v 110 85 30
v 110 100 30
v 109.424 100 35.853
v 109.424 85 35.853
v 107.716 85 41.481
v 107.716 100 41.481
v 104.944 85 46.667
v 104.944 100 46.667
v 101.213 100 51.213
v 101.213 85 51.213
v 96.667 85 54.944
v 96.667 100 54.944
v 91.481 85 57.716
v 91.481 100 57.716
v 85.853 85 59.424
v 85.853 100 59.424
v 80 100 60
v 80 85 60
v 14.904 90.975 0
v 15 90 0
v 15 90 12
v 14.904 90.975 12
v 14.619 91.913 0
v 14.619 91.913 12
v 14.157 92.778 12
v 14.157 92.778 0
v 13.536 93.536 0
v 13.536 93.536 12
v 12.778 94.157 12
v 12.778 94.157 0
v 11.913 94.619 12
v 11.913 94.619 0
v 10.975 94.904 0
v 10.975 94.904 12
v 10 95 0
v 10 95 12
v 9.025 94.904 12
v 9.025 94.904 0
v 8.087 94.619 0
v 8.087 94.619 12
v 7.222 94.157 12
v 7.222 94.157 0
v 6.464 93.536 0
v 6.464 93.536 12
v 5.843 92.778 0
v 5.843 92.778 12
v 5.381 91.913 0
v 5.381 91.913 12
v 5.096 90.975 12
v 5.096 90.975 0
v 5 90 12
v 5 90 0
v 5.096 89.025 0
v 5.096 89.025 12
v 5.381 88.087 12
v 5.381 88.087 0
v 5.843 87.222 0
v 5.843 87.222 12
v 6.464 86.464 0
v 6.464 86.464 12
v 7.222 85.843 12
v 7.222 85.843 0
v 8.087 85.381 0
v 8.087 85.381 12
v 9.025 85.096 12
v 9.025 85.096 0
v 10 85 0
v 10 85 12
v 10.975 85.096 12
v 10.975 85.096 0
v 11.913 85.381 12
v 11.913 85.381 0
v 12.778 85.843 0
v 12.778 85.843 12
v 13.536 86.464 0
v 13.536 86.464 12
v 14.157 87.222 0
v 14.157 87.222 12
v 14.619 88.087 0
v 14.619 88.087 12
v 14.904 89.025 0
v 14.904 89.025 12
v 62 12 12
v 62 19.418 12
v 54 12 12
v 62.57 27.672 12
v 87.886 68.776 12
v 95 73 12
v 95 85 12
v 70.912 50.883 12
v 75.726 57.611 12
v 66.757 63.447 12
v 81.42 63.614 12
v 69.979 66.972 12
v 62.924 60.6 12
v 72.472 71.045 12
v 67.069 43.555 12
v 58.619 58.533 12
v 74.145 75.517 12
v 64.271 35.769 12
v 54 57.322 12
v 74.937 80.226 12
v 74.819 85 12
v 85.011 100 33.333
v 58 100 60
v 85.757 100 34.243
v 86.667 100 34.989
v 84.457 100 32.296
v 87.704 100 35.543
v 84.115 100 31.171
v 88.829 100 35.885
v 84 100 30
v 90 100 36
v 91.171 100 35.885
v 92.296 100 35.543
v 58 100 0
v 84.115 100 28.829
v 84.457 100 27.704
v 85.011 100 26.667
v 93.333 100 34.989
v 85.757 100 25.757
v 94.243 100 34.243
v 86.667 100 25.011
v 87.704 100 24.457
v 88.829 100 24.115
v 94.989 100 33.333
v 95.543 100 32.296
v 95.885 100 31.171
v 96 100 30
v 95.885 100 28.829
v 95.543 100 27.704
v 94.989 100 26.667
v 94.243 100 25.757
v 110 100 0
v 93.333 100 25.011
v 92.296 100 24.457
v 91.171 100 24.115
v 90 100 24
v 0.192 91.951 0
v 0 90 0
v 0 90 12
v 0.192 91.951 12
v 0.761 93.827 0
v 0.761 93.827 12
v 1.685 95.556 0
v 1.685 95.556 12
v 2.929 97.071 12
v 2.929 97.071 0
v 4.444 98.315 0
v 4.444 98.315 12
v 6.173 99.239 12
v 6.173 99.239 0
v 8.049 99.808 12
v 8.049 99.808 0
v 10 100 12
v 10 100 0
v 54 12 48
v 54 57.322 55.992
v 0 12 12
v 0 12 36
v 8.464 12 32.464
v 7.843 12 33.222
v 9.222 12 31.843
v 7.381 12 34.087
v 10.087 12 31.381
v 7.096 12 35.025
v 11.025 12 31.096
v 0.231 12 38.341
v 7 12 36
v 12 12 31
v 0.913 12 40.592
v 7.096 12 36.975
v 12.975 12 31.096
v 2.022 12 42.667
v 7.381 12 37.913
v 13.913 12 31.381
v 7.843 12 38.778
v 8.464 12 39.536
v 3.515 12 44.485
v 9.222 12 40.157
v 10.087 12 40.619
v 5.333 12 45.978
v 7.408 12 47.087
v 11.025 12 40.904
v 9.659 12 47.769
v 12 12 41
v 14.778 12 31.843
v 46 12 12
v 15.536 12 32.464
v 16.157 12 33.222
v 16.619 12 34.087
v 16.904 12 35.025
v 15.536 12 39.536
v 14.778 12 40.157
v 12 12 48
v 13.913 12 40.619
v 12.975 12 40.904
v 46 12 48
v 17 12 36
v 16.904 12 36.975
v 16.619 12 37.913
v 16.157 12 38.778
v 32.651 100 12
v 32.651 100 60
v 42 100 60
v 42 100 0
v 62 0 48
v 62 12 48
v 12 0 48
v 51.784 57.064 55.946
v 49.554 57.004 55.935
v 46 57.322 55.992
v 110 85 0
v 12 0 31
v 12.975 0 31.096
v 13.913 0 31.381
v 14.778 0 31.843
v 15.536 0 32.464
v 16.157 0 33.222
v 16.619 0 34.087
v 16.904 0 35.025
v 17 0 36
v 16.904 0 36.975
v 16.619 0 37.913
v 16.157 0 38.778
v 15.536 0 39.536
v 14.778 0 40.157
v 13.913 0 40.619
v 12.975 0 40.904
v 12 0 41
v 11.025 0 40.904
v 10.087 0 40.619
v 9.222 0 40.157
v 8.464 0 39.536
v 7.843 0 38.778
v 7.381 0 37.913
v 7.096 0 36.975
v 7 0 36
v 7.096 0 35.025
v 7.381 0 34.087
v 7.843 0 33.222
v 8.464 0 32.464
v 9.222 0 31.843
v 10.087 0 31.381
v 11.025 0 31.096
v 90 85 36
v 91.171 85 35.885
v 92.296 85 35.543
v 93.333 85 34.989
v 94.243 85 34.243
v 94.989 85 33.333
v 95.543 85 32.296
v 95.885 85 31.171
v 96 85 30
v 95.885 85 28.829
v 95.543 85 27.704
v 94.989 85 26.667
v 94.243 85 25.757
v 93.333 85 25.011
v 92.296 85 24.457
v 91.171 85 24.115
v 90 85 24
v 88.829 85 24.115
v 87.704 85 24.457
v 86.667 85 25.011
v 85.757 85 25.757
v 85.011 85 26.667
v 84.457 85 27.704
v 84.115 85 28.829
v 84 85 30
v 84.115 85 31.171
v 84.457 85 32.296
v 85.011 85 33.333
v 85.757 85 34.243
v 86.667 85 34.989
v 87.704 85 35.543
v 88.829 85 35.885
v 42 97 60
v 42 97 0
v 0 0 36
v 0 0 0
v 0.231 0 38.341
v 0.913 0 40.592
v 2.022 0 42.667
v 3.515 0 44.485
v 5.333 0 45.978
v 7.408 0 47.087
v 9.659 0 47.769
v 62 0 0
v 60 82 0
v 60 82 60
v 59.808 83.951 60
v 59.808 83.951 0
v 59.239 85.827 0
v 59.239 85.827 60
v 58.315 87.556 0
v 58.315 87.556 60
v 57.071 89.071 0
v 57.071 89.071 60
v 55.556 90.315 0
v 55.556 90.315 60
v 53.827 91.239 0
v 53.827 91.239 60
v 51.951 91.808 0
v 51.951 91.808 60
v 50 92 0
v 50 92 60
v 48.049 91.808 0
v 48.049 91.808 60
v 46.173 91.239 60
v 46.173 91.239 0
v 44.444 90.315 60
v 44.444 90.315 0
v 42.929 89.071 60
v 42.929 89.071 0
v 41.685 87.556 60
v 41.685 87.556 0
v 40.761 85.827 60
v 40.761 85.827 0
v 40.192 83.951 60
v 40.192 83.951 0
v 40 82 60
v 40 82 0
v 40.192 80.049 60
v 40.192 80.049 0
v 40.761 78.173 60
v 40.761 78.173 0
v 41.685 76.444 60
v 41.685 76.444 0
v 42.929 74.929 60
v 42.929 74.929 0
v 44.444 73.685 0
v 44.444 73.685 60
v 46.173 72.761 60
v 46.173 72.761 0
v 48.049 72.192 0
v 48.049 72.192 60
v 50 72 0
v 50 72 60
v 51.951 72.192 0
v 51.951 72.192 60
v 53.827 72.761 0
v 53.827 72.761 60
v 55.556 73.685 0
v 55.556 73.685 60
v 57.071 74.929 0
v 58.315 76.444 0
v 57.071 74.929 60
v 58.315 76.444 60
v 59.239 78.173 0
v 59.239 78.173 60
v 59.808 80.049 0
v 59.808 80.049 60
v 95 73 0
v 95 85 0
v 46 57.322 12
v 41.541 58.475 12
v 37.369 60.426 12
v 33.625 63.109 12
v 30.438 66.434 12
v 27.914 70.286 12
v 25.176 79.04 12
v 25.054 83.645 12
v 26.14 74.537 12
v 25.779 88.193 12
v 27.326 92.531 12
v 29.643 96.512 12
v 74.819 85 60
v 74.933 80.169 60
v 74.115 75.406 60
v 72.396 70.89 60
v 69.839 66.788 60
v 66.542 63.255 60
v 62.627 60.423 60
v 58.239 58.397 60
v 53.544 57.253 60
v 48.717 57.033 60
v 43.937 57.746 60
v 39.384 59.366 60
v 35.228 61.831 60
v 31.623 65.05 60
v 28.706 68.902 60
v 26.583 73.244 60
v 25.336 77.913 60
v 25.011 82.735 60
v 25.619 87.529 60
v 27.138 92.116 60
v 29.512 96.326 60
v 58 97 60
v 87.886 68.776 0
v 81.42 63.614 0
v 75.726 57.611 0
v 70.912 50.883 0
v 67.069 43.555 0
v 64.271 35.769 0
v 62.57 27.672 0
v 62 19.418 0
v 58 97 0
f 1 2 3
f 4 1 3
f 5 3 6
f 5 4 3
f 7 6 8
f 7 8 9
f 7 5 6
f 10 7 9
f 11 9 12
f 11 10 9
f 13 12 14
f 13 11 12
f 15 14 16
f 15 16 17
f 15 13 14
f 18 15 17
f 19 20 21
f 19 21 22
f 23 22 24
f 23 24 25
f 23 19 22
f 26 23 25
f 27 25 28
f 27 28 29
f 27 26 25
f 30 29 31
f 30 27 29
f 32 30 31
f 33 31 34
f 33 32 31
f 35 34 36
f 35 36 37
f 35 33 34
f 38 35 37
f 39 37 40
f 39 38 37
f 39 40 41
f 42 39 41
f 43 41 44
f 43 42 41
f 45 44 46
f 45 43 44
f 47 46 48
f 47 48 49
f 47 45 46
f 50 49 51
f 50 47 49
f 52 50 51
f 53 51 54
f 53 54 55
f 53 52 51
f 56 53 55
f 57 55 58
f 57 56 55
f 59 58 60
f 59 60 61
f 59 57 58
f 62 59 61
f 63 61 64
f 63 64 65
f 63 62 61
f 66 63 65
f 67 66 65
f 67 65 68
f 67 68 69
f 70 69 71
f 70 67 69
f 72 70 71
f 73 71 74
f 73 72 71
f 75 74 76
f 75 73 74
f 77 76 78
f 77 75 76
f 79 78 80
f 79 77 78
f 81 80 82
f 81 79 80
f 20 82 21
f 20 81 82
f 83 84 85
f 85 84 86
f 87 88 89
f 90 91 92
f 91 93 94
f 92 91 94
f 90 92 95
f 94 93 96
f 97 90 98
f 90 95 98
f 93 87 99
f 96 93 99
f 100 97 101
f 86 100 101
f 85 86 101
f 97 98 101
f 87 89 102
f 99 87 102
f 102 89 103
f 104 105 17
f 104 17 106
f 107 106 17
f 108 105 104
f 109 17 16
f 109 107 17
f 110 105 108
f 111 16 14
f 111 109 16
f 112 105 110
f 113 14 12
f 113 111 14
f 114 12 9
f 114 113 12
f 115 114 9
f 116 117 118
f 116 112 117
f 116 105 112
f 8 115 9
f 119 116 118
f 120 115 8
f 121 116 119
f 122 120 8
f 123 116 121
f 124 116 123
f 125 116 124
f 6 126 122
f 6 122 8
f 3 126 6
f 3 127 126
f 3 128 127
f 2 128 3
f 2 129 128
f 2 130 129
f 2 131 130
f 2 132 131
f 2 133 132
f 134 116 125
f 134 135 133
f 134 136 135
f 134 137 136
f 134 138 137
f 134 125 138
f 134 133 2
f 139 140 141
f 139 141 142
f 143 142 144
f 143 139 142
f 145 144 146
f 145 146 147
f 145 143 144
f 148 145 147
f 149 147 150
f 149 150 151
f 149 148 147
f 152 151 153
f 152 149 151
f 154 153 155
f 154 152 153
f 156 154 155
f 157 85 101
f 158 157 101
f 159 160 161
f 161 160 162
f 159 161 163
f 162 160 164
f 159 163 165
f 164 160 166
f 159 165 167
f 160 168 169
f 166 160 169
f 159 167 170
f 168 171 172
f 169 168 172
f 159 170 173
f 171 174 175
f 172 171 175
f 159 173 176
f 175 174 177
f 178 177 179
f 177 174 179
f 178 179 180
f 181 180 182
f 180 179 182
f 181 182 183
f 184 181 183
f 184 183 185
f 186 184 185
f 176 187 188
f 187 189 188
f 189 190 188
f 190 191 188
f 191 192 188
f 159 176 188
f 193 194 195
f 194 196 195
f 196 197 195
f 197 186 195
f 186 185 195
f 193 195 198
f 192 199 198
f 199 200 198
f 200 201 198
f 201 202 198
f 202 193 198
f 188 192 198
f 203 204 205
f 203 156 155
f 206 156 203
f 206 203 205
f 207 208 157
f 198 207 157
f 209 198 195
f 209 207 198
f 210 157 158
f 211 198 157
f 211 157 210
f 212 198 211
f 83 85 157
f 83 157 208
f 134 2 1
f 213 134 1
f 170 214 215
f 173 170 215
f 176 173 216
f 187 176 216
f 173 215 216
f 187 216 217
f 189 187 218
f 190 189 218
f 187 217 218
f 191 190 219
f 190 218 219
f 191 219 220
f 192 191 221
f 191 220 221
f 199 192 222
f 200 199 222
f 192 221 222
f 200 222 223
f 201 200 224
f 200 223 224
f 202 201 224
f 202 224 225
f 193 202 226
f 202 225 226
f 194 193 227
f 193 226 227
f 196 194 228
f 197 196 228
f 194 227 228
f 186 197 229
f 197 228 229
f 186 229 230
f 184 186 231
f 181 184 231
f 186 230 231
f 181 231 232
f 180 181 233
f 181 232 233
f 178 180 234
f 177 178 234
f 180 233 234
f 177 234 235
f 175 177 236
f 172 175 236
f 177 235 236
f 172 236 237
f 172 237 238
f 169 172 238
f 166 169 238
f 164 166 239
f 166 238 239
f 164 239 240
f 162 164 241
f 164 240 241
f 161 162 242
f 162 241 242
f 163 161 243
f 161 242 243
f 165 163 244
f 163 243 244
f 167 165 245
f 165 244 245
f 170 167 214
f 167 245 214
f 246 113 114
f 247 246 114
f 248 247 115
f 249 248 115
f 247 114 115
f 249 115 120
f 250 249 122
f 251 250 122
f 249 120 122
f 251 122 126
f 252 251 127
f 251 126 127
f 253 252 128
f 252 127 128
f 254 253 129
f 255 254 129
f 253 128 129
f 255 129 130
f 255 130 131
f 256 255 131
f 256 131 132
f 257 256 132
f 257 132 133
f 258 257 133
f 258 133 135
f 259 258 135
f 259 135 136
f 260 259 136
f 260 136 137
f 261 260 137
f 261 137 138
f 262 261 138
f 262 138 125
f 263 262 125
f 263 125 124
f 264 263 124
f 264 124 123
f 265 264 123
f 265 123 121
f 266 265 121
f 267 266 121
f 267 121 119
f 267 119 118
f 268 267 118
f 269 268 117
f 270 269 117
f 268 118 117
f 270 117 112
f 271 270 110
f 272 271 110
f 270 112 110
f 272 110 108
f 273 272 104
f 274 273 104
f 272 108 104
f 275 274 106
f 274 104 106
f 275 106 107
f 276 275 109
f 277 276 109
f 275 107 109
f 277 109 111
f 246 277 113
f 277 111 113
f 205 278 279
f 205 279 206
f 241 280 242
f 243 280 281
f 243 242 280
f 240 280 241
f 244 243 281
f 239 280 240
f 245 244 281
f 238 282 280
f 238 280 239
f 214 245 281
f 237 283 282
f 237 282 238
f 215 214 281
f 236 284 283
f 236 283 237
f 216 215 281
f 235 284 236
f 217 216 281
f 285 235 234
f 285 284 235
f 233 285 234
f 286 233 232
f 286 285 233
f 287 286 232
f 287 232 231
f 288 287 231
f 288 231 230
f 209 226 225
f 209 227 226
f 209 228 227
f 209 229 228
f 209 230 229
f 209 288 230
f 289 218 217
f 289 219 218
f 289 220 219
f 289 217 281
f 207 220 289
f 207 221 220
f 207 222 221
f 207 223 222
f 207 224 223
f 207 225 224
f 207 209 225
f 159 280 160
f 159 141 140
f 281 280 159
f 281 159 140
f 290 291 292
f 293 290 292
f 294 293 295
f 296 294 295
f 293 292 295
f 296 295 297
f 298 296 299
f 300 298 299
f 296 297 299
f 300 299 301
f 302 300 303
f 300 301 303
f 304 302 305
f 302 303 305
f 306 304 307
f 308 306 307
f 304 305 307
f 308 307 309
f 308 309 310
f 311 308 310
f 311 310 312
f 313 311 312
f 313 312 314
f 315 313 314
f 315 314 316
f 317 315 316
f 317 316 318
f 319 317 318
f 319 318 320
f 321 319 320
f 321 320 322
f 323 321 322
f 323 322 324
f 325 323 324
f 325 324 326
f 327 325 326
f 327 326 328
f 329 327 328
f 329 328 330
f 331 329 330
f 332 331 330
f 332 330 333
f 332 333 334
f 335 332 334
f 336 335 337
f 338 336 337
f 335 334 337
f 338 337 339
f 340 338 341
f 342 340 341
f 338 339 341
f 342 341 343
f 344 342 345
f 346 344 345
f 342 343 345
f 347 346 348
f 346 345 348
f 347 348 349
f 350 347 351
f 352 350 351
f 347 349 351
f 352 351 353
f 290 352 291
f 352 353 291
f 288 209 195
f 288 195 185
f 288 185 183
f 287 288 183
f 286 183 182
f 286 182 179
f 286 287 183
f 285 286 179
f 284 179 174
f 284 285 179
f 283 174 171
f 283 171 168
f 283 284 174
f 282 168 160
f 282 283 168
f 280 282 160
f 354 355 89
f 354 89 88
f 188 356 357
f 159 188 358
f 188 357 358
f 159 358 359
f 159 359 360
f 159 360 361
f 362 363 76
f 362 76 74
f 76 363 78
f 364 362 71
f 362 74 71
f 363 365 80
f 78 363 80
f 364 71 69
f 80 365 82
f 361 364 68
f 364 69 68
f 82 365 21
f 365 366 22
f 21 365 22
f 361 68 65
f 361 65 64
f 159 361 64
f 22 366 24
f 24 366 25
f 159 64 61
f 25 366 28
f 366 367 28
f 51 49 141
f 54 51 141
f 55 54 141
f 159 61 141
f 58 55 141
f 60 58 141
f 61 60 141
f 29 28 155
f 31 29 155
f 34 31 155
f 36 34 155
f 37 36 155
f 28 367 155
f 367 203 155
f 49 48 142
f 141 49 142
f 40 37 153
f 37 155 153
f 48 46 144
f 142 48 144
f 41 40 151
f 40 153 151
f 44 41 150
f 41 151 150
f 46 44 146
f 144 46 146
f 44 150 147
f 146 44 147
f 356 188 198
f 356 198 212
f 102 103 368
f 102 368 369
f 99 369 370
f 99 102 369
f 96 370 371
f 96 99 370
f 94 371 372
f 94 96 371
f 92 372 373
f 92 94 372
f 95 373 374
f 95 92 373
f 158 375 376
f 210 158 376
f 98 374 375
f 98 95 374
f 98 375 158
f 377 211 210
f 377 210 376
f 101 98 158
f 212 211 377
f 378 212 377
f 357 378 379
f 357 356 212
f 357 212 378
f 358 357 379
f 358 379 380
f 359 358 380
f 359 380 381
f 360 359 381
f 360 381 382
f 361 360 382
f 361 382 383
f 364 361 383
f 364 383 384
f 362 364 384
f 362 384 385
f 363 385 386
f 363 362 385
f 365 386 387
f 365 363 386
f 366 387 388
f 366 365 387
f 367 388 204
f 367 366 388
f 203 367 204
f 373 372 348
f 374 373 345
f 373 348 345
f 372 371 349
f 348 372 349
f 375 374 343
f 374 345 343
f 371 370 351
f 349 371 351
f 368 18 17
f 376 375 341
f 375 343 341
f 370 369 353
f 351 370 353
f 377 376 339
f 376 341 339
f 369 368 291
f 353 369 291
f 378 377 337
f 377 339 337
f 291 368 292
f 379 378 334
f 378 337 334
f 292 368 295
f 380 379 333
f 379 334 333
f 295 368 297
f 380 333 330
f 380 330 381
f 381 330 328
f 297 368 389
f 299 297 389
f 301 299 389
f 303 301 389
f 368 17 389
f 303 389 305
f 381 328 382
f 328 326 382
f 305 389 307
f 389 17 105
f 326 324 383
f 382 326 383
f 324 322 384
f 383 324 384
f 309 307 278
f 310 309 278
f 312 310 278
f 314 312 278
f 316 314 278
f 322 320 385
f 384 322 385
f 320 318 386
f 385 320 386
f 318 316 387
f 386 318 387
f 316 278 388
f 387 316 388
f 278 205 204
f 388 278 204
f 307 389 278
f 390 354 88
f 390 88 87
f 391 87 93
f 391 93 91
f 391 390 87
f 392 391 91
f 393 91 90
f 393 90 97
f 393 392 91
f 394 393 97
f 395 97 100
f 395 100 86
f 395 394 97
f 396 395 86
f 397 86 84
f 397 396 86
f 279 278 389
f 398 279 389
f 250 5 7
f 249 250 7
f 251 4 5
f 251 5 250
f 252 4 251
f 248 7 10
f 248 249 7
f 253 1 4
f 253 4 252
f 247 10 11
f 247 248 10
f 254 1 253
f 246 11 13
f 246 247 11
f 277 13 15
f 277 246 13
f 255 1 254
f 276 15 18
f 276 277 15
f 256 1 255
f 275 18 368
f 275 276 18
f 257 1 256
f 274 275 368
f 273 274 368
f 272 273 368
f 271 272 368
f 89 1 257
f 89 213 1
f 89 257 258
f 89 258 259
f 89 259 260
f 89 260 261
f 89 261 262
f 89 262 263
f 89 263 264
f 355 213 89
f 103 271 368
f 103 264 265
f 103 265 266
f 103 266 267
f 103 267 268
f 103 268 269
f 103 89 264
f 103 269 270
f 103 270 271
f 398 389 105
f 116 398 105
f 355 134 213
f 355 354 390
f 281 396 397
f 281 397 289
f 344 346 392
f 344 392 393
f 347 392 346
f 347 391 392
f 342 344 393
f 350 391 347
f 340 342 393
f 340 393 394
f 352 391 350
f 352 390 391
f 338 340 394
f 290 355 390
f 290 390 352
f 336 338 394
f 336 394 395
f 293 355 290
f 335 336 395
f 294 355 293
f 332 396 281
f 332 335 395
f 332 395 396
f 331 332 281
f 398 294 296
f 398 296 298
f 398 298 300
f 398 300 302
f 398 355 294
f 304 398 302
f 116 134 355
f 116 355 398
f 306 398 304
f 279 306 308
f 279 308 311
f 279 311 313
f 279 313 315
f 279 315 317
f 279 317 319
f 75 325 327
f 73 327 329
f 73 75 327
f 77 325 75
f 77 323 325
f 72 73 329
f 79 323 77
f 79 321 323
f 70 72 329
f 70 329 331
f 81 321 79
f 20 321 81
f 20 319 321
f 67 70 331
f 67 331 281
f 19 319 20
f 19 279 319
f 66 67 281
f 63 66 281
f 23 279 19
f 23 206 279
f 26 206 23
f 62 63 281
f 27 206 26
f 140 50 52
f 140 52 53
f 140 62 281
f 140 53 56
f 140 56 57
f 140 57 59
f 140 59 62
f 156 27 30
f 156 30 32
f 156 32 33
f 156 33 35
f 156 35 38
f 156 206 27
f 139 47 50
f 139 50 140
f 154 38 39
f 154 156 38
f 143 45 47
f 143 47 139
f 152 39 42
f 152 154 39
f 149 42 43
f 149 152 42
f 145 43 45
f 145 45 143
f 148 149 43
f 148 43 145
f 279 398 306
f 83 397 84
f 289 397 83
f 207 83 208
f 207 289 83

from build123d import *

# Parameters (mm, degrees)
SKETCH1_R           = 5
BOSS_EXTRUDE1_DEPTH = 12
SKETCH2_R           = 5
BOSS_EXTRUDE2_DEPTH = 12
BOSS_EXTRUDE3_DEPTH = 48
FILLET1_R           = 30
SKETCH6_R           = 10
CUT_EXTRUDE1_DEPTH  = 61
SKETCH7_W           = 16
SKETCH7_H           = 3
CUT_EXTRUDE2_DEPTH  = 61
CUT_EXTRUDE3_REACH  = 102
SKETCH9_R           = 6
RIB9_REACH          = 62
SKETCH8_WALL_W      = 167.694197534
SKETCH8_WALL_H      = 8


with BuildPart() as part:
    # Sketch1 → Boss-Extrude1 (new body)
    with BuildSketch(Plane.XY):
        with BuildLine():
            Line((10, 100), (110, 100))
            Line((110, 100), (110, 85))
            Line((110, 85), (95, 85))
            Line((95, 85), (95, 73))
            ThreePointArc((95, 73), (70.911840902, 50.882552147), (62, 19.418286702))
            Line((62, 19.418286702), (62, 0))
            Line((62, 0), (0, 0))
            Line((0, 0), (0, 90))
            ThreePointArc((0, 90), (2.928932188, 97.071067812), (10, 100))
        make_face()
        with Locations((10, 90)):
            Circle(SKETCH1_R, mode=Mode.SUBTRACT)
    extrude(amount=BOSS_EXTRUDE1_DEPTH)

    # Sketch2 → Boss-Extrude2 (add)
    with BuildSketch(Plane.XZ):
        with BuildLine():
            Line((62, 12), (62, 48))
            Line((62, 48), (12, 48))
            ThreePointArc((12, 48), (3.514718626, 44.485281374), (0, 36))
            Line((0, 36), (0, 12))
            Line((0, 12), (62, 12))
        make_face()
        with Locations(Location((12, 36, 0), (0, 0, 270))):  # turned: the seam where the file's is
            Circle(SKETCH2_R, mode=Mode.SUBTRACT)
    extrude(amount=-BOSS_EXTRUDE2_DEPTH)

    # Sketch5 → Boss-Extrude3 (add)
    with BuildSketch(Plane.XY.offset(12)):
        with BuildLine():
            Line((32.650648427, 100), (110, 100))
            Line((110, 100), (110, 85))
            Line((110, 85), (74.819347292, 85))
            ThreePointArc((74.819347292, 85), (41.621443501, 58.445811604), (32.650648427, 100))
        make_face()
    extrude(amount=BOSS_EXTRUDE3_DEPTH)

    # Fillet1
    fillet1_edges = [part.edges().sort_by_distance(p)[0] for p in [
        (110, 92.5, 60),
    ]]
    fillet(fillet1_edges, radius=FILLET1_R)

    # Sketch6 → Cut-Extrude1 (cut, through all)
    with BuildSketch(Plane.XY.offset(60)):
        with Locations((50, 82)):
            Circle(SKETCH6_R)
    extrude(amount=-CUT_EXTRUDE1_DEPTH, mode=Mode.SUBTRACT)

    # Sketch7 → Cut-Extrude2 (cut, through all)
    with BuildSketch(Plane.XY.offset(60)):
        with Locations((50, 98.5)):
            Rectangle(SKETCH7_W, SKETCH7_H)
    extrude(amount=-CUT_EXTRUDE2_DEPTH, mode=Mode.SUBTRACT)

    # Sketch9 → Cut-Extrude3 (cut, up to next)
    with BuildSketch(Plane(origin=(0, 100, 0), x_dir=(1, 0, 0), z_dir=(0, 1, 0)), mode=Mode.PRIVATE) as cut_extrude3_sk1:
        with Locations(Location((90, -30, 0), (0, 0, 270))):  # turned: the seam where the file's is
            Circle(SKETCH9_R)
    cut_extrude3_tool1 = extrude(cut_extrude3_sk1.sketch, amount=-CUT_EXTRUDE3_REACH, mode=Mode.PRIVATE) & part.part
    add(cut_extrude3_tool1.solids().sort_by_distance((90, 100, 30))[0], mode=Mode.SUBTRACT)

    # Sketch8 wall → Rib9 (add, up to next)
    with BuildSketch(Plane(origin=(50, 34.5, 51.967357066), x_dir=(0, 0.984807753, 0.173648178), z_dir=(0, -0.173648178, 0.984807753)), mode=Mode.PRIVATE) as rib9_sk1:
        Rectangle(SKETCH8_WALL_W, SKETCH8_WALL_H)
    rib9_tool1 = extrude(rib9_sk1.sketch, amount=-RIB9_REACH, mode=Mode.PRIVATE) - part.part
    add(rib9_tool1.solids().sort_by_distance((50, 34.5, 51.967357066))[0])


solid = part.part
